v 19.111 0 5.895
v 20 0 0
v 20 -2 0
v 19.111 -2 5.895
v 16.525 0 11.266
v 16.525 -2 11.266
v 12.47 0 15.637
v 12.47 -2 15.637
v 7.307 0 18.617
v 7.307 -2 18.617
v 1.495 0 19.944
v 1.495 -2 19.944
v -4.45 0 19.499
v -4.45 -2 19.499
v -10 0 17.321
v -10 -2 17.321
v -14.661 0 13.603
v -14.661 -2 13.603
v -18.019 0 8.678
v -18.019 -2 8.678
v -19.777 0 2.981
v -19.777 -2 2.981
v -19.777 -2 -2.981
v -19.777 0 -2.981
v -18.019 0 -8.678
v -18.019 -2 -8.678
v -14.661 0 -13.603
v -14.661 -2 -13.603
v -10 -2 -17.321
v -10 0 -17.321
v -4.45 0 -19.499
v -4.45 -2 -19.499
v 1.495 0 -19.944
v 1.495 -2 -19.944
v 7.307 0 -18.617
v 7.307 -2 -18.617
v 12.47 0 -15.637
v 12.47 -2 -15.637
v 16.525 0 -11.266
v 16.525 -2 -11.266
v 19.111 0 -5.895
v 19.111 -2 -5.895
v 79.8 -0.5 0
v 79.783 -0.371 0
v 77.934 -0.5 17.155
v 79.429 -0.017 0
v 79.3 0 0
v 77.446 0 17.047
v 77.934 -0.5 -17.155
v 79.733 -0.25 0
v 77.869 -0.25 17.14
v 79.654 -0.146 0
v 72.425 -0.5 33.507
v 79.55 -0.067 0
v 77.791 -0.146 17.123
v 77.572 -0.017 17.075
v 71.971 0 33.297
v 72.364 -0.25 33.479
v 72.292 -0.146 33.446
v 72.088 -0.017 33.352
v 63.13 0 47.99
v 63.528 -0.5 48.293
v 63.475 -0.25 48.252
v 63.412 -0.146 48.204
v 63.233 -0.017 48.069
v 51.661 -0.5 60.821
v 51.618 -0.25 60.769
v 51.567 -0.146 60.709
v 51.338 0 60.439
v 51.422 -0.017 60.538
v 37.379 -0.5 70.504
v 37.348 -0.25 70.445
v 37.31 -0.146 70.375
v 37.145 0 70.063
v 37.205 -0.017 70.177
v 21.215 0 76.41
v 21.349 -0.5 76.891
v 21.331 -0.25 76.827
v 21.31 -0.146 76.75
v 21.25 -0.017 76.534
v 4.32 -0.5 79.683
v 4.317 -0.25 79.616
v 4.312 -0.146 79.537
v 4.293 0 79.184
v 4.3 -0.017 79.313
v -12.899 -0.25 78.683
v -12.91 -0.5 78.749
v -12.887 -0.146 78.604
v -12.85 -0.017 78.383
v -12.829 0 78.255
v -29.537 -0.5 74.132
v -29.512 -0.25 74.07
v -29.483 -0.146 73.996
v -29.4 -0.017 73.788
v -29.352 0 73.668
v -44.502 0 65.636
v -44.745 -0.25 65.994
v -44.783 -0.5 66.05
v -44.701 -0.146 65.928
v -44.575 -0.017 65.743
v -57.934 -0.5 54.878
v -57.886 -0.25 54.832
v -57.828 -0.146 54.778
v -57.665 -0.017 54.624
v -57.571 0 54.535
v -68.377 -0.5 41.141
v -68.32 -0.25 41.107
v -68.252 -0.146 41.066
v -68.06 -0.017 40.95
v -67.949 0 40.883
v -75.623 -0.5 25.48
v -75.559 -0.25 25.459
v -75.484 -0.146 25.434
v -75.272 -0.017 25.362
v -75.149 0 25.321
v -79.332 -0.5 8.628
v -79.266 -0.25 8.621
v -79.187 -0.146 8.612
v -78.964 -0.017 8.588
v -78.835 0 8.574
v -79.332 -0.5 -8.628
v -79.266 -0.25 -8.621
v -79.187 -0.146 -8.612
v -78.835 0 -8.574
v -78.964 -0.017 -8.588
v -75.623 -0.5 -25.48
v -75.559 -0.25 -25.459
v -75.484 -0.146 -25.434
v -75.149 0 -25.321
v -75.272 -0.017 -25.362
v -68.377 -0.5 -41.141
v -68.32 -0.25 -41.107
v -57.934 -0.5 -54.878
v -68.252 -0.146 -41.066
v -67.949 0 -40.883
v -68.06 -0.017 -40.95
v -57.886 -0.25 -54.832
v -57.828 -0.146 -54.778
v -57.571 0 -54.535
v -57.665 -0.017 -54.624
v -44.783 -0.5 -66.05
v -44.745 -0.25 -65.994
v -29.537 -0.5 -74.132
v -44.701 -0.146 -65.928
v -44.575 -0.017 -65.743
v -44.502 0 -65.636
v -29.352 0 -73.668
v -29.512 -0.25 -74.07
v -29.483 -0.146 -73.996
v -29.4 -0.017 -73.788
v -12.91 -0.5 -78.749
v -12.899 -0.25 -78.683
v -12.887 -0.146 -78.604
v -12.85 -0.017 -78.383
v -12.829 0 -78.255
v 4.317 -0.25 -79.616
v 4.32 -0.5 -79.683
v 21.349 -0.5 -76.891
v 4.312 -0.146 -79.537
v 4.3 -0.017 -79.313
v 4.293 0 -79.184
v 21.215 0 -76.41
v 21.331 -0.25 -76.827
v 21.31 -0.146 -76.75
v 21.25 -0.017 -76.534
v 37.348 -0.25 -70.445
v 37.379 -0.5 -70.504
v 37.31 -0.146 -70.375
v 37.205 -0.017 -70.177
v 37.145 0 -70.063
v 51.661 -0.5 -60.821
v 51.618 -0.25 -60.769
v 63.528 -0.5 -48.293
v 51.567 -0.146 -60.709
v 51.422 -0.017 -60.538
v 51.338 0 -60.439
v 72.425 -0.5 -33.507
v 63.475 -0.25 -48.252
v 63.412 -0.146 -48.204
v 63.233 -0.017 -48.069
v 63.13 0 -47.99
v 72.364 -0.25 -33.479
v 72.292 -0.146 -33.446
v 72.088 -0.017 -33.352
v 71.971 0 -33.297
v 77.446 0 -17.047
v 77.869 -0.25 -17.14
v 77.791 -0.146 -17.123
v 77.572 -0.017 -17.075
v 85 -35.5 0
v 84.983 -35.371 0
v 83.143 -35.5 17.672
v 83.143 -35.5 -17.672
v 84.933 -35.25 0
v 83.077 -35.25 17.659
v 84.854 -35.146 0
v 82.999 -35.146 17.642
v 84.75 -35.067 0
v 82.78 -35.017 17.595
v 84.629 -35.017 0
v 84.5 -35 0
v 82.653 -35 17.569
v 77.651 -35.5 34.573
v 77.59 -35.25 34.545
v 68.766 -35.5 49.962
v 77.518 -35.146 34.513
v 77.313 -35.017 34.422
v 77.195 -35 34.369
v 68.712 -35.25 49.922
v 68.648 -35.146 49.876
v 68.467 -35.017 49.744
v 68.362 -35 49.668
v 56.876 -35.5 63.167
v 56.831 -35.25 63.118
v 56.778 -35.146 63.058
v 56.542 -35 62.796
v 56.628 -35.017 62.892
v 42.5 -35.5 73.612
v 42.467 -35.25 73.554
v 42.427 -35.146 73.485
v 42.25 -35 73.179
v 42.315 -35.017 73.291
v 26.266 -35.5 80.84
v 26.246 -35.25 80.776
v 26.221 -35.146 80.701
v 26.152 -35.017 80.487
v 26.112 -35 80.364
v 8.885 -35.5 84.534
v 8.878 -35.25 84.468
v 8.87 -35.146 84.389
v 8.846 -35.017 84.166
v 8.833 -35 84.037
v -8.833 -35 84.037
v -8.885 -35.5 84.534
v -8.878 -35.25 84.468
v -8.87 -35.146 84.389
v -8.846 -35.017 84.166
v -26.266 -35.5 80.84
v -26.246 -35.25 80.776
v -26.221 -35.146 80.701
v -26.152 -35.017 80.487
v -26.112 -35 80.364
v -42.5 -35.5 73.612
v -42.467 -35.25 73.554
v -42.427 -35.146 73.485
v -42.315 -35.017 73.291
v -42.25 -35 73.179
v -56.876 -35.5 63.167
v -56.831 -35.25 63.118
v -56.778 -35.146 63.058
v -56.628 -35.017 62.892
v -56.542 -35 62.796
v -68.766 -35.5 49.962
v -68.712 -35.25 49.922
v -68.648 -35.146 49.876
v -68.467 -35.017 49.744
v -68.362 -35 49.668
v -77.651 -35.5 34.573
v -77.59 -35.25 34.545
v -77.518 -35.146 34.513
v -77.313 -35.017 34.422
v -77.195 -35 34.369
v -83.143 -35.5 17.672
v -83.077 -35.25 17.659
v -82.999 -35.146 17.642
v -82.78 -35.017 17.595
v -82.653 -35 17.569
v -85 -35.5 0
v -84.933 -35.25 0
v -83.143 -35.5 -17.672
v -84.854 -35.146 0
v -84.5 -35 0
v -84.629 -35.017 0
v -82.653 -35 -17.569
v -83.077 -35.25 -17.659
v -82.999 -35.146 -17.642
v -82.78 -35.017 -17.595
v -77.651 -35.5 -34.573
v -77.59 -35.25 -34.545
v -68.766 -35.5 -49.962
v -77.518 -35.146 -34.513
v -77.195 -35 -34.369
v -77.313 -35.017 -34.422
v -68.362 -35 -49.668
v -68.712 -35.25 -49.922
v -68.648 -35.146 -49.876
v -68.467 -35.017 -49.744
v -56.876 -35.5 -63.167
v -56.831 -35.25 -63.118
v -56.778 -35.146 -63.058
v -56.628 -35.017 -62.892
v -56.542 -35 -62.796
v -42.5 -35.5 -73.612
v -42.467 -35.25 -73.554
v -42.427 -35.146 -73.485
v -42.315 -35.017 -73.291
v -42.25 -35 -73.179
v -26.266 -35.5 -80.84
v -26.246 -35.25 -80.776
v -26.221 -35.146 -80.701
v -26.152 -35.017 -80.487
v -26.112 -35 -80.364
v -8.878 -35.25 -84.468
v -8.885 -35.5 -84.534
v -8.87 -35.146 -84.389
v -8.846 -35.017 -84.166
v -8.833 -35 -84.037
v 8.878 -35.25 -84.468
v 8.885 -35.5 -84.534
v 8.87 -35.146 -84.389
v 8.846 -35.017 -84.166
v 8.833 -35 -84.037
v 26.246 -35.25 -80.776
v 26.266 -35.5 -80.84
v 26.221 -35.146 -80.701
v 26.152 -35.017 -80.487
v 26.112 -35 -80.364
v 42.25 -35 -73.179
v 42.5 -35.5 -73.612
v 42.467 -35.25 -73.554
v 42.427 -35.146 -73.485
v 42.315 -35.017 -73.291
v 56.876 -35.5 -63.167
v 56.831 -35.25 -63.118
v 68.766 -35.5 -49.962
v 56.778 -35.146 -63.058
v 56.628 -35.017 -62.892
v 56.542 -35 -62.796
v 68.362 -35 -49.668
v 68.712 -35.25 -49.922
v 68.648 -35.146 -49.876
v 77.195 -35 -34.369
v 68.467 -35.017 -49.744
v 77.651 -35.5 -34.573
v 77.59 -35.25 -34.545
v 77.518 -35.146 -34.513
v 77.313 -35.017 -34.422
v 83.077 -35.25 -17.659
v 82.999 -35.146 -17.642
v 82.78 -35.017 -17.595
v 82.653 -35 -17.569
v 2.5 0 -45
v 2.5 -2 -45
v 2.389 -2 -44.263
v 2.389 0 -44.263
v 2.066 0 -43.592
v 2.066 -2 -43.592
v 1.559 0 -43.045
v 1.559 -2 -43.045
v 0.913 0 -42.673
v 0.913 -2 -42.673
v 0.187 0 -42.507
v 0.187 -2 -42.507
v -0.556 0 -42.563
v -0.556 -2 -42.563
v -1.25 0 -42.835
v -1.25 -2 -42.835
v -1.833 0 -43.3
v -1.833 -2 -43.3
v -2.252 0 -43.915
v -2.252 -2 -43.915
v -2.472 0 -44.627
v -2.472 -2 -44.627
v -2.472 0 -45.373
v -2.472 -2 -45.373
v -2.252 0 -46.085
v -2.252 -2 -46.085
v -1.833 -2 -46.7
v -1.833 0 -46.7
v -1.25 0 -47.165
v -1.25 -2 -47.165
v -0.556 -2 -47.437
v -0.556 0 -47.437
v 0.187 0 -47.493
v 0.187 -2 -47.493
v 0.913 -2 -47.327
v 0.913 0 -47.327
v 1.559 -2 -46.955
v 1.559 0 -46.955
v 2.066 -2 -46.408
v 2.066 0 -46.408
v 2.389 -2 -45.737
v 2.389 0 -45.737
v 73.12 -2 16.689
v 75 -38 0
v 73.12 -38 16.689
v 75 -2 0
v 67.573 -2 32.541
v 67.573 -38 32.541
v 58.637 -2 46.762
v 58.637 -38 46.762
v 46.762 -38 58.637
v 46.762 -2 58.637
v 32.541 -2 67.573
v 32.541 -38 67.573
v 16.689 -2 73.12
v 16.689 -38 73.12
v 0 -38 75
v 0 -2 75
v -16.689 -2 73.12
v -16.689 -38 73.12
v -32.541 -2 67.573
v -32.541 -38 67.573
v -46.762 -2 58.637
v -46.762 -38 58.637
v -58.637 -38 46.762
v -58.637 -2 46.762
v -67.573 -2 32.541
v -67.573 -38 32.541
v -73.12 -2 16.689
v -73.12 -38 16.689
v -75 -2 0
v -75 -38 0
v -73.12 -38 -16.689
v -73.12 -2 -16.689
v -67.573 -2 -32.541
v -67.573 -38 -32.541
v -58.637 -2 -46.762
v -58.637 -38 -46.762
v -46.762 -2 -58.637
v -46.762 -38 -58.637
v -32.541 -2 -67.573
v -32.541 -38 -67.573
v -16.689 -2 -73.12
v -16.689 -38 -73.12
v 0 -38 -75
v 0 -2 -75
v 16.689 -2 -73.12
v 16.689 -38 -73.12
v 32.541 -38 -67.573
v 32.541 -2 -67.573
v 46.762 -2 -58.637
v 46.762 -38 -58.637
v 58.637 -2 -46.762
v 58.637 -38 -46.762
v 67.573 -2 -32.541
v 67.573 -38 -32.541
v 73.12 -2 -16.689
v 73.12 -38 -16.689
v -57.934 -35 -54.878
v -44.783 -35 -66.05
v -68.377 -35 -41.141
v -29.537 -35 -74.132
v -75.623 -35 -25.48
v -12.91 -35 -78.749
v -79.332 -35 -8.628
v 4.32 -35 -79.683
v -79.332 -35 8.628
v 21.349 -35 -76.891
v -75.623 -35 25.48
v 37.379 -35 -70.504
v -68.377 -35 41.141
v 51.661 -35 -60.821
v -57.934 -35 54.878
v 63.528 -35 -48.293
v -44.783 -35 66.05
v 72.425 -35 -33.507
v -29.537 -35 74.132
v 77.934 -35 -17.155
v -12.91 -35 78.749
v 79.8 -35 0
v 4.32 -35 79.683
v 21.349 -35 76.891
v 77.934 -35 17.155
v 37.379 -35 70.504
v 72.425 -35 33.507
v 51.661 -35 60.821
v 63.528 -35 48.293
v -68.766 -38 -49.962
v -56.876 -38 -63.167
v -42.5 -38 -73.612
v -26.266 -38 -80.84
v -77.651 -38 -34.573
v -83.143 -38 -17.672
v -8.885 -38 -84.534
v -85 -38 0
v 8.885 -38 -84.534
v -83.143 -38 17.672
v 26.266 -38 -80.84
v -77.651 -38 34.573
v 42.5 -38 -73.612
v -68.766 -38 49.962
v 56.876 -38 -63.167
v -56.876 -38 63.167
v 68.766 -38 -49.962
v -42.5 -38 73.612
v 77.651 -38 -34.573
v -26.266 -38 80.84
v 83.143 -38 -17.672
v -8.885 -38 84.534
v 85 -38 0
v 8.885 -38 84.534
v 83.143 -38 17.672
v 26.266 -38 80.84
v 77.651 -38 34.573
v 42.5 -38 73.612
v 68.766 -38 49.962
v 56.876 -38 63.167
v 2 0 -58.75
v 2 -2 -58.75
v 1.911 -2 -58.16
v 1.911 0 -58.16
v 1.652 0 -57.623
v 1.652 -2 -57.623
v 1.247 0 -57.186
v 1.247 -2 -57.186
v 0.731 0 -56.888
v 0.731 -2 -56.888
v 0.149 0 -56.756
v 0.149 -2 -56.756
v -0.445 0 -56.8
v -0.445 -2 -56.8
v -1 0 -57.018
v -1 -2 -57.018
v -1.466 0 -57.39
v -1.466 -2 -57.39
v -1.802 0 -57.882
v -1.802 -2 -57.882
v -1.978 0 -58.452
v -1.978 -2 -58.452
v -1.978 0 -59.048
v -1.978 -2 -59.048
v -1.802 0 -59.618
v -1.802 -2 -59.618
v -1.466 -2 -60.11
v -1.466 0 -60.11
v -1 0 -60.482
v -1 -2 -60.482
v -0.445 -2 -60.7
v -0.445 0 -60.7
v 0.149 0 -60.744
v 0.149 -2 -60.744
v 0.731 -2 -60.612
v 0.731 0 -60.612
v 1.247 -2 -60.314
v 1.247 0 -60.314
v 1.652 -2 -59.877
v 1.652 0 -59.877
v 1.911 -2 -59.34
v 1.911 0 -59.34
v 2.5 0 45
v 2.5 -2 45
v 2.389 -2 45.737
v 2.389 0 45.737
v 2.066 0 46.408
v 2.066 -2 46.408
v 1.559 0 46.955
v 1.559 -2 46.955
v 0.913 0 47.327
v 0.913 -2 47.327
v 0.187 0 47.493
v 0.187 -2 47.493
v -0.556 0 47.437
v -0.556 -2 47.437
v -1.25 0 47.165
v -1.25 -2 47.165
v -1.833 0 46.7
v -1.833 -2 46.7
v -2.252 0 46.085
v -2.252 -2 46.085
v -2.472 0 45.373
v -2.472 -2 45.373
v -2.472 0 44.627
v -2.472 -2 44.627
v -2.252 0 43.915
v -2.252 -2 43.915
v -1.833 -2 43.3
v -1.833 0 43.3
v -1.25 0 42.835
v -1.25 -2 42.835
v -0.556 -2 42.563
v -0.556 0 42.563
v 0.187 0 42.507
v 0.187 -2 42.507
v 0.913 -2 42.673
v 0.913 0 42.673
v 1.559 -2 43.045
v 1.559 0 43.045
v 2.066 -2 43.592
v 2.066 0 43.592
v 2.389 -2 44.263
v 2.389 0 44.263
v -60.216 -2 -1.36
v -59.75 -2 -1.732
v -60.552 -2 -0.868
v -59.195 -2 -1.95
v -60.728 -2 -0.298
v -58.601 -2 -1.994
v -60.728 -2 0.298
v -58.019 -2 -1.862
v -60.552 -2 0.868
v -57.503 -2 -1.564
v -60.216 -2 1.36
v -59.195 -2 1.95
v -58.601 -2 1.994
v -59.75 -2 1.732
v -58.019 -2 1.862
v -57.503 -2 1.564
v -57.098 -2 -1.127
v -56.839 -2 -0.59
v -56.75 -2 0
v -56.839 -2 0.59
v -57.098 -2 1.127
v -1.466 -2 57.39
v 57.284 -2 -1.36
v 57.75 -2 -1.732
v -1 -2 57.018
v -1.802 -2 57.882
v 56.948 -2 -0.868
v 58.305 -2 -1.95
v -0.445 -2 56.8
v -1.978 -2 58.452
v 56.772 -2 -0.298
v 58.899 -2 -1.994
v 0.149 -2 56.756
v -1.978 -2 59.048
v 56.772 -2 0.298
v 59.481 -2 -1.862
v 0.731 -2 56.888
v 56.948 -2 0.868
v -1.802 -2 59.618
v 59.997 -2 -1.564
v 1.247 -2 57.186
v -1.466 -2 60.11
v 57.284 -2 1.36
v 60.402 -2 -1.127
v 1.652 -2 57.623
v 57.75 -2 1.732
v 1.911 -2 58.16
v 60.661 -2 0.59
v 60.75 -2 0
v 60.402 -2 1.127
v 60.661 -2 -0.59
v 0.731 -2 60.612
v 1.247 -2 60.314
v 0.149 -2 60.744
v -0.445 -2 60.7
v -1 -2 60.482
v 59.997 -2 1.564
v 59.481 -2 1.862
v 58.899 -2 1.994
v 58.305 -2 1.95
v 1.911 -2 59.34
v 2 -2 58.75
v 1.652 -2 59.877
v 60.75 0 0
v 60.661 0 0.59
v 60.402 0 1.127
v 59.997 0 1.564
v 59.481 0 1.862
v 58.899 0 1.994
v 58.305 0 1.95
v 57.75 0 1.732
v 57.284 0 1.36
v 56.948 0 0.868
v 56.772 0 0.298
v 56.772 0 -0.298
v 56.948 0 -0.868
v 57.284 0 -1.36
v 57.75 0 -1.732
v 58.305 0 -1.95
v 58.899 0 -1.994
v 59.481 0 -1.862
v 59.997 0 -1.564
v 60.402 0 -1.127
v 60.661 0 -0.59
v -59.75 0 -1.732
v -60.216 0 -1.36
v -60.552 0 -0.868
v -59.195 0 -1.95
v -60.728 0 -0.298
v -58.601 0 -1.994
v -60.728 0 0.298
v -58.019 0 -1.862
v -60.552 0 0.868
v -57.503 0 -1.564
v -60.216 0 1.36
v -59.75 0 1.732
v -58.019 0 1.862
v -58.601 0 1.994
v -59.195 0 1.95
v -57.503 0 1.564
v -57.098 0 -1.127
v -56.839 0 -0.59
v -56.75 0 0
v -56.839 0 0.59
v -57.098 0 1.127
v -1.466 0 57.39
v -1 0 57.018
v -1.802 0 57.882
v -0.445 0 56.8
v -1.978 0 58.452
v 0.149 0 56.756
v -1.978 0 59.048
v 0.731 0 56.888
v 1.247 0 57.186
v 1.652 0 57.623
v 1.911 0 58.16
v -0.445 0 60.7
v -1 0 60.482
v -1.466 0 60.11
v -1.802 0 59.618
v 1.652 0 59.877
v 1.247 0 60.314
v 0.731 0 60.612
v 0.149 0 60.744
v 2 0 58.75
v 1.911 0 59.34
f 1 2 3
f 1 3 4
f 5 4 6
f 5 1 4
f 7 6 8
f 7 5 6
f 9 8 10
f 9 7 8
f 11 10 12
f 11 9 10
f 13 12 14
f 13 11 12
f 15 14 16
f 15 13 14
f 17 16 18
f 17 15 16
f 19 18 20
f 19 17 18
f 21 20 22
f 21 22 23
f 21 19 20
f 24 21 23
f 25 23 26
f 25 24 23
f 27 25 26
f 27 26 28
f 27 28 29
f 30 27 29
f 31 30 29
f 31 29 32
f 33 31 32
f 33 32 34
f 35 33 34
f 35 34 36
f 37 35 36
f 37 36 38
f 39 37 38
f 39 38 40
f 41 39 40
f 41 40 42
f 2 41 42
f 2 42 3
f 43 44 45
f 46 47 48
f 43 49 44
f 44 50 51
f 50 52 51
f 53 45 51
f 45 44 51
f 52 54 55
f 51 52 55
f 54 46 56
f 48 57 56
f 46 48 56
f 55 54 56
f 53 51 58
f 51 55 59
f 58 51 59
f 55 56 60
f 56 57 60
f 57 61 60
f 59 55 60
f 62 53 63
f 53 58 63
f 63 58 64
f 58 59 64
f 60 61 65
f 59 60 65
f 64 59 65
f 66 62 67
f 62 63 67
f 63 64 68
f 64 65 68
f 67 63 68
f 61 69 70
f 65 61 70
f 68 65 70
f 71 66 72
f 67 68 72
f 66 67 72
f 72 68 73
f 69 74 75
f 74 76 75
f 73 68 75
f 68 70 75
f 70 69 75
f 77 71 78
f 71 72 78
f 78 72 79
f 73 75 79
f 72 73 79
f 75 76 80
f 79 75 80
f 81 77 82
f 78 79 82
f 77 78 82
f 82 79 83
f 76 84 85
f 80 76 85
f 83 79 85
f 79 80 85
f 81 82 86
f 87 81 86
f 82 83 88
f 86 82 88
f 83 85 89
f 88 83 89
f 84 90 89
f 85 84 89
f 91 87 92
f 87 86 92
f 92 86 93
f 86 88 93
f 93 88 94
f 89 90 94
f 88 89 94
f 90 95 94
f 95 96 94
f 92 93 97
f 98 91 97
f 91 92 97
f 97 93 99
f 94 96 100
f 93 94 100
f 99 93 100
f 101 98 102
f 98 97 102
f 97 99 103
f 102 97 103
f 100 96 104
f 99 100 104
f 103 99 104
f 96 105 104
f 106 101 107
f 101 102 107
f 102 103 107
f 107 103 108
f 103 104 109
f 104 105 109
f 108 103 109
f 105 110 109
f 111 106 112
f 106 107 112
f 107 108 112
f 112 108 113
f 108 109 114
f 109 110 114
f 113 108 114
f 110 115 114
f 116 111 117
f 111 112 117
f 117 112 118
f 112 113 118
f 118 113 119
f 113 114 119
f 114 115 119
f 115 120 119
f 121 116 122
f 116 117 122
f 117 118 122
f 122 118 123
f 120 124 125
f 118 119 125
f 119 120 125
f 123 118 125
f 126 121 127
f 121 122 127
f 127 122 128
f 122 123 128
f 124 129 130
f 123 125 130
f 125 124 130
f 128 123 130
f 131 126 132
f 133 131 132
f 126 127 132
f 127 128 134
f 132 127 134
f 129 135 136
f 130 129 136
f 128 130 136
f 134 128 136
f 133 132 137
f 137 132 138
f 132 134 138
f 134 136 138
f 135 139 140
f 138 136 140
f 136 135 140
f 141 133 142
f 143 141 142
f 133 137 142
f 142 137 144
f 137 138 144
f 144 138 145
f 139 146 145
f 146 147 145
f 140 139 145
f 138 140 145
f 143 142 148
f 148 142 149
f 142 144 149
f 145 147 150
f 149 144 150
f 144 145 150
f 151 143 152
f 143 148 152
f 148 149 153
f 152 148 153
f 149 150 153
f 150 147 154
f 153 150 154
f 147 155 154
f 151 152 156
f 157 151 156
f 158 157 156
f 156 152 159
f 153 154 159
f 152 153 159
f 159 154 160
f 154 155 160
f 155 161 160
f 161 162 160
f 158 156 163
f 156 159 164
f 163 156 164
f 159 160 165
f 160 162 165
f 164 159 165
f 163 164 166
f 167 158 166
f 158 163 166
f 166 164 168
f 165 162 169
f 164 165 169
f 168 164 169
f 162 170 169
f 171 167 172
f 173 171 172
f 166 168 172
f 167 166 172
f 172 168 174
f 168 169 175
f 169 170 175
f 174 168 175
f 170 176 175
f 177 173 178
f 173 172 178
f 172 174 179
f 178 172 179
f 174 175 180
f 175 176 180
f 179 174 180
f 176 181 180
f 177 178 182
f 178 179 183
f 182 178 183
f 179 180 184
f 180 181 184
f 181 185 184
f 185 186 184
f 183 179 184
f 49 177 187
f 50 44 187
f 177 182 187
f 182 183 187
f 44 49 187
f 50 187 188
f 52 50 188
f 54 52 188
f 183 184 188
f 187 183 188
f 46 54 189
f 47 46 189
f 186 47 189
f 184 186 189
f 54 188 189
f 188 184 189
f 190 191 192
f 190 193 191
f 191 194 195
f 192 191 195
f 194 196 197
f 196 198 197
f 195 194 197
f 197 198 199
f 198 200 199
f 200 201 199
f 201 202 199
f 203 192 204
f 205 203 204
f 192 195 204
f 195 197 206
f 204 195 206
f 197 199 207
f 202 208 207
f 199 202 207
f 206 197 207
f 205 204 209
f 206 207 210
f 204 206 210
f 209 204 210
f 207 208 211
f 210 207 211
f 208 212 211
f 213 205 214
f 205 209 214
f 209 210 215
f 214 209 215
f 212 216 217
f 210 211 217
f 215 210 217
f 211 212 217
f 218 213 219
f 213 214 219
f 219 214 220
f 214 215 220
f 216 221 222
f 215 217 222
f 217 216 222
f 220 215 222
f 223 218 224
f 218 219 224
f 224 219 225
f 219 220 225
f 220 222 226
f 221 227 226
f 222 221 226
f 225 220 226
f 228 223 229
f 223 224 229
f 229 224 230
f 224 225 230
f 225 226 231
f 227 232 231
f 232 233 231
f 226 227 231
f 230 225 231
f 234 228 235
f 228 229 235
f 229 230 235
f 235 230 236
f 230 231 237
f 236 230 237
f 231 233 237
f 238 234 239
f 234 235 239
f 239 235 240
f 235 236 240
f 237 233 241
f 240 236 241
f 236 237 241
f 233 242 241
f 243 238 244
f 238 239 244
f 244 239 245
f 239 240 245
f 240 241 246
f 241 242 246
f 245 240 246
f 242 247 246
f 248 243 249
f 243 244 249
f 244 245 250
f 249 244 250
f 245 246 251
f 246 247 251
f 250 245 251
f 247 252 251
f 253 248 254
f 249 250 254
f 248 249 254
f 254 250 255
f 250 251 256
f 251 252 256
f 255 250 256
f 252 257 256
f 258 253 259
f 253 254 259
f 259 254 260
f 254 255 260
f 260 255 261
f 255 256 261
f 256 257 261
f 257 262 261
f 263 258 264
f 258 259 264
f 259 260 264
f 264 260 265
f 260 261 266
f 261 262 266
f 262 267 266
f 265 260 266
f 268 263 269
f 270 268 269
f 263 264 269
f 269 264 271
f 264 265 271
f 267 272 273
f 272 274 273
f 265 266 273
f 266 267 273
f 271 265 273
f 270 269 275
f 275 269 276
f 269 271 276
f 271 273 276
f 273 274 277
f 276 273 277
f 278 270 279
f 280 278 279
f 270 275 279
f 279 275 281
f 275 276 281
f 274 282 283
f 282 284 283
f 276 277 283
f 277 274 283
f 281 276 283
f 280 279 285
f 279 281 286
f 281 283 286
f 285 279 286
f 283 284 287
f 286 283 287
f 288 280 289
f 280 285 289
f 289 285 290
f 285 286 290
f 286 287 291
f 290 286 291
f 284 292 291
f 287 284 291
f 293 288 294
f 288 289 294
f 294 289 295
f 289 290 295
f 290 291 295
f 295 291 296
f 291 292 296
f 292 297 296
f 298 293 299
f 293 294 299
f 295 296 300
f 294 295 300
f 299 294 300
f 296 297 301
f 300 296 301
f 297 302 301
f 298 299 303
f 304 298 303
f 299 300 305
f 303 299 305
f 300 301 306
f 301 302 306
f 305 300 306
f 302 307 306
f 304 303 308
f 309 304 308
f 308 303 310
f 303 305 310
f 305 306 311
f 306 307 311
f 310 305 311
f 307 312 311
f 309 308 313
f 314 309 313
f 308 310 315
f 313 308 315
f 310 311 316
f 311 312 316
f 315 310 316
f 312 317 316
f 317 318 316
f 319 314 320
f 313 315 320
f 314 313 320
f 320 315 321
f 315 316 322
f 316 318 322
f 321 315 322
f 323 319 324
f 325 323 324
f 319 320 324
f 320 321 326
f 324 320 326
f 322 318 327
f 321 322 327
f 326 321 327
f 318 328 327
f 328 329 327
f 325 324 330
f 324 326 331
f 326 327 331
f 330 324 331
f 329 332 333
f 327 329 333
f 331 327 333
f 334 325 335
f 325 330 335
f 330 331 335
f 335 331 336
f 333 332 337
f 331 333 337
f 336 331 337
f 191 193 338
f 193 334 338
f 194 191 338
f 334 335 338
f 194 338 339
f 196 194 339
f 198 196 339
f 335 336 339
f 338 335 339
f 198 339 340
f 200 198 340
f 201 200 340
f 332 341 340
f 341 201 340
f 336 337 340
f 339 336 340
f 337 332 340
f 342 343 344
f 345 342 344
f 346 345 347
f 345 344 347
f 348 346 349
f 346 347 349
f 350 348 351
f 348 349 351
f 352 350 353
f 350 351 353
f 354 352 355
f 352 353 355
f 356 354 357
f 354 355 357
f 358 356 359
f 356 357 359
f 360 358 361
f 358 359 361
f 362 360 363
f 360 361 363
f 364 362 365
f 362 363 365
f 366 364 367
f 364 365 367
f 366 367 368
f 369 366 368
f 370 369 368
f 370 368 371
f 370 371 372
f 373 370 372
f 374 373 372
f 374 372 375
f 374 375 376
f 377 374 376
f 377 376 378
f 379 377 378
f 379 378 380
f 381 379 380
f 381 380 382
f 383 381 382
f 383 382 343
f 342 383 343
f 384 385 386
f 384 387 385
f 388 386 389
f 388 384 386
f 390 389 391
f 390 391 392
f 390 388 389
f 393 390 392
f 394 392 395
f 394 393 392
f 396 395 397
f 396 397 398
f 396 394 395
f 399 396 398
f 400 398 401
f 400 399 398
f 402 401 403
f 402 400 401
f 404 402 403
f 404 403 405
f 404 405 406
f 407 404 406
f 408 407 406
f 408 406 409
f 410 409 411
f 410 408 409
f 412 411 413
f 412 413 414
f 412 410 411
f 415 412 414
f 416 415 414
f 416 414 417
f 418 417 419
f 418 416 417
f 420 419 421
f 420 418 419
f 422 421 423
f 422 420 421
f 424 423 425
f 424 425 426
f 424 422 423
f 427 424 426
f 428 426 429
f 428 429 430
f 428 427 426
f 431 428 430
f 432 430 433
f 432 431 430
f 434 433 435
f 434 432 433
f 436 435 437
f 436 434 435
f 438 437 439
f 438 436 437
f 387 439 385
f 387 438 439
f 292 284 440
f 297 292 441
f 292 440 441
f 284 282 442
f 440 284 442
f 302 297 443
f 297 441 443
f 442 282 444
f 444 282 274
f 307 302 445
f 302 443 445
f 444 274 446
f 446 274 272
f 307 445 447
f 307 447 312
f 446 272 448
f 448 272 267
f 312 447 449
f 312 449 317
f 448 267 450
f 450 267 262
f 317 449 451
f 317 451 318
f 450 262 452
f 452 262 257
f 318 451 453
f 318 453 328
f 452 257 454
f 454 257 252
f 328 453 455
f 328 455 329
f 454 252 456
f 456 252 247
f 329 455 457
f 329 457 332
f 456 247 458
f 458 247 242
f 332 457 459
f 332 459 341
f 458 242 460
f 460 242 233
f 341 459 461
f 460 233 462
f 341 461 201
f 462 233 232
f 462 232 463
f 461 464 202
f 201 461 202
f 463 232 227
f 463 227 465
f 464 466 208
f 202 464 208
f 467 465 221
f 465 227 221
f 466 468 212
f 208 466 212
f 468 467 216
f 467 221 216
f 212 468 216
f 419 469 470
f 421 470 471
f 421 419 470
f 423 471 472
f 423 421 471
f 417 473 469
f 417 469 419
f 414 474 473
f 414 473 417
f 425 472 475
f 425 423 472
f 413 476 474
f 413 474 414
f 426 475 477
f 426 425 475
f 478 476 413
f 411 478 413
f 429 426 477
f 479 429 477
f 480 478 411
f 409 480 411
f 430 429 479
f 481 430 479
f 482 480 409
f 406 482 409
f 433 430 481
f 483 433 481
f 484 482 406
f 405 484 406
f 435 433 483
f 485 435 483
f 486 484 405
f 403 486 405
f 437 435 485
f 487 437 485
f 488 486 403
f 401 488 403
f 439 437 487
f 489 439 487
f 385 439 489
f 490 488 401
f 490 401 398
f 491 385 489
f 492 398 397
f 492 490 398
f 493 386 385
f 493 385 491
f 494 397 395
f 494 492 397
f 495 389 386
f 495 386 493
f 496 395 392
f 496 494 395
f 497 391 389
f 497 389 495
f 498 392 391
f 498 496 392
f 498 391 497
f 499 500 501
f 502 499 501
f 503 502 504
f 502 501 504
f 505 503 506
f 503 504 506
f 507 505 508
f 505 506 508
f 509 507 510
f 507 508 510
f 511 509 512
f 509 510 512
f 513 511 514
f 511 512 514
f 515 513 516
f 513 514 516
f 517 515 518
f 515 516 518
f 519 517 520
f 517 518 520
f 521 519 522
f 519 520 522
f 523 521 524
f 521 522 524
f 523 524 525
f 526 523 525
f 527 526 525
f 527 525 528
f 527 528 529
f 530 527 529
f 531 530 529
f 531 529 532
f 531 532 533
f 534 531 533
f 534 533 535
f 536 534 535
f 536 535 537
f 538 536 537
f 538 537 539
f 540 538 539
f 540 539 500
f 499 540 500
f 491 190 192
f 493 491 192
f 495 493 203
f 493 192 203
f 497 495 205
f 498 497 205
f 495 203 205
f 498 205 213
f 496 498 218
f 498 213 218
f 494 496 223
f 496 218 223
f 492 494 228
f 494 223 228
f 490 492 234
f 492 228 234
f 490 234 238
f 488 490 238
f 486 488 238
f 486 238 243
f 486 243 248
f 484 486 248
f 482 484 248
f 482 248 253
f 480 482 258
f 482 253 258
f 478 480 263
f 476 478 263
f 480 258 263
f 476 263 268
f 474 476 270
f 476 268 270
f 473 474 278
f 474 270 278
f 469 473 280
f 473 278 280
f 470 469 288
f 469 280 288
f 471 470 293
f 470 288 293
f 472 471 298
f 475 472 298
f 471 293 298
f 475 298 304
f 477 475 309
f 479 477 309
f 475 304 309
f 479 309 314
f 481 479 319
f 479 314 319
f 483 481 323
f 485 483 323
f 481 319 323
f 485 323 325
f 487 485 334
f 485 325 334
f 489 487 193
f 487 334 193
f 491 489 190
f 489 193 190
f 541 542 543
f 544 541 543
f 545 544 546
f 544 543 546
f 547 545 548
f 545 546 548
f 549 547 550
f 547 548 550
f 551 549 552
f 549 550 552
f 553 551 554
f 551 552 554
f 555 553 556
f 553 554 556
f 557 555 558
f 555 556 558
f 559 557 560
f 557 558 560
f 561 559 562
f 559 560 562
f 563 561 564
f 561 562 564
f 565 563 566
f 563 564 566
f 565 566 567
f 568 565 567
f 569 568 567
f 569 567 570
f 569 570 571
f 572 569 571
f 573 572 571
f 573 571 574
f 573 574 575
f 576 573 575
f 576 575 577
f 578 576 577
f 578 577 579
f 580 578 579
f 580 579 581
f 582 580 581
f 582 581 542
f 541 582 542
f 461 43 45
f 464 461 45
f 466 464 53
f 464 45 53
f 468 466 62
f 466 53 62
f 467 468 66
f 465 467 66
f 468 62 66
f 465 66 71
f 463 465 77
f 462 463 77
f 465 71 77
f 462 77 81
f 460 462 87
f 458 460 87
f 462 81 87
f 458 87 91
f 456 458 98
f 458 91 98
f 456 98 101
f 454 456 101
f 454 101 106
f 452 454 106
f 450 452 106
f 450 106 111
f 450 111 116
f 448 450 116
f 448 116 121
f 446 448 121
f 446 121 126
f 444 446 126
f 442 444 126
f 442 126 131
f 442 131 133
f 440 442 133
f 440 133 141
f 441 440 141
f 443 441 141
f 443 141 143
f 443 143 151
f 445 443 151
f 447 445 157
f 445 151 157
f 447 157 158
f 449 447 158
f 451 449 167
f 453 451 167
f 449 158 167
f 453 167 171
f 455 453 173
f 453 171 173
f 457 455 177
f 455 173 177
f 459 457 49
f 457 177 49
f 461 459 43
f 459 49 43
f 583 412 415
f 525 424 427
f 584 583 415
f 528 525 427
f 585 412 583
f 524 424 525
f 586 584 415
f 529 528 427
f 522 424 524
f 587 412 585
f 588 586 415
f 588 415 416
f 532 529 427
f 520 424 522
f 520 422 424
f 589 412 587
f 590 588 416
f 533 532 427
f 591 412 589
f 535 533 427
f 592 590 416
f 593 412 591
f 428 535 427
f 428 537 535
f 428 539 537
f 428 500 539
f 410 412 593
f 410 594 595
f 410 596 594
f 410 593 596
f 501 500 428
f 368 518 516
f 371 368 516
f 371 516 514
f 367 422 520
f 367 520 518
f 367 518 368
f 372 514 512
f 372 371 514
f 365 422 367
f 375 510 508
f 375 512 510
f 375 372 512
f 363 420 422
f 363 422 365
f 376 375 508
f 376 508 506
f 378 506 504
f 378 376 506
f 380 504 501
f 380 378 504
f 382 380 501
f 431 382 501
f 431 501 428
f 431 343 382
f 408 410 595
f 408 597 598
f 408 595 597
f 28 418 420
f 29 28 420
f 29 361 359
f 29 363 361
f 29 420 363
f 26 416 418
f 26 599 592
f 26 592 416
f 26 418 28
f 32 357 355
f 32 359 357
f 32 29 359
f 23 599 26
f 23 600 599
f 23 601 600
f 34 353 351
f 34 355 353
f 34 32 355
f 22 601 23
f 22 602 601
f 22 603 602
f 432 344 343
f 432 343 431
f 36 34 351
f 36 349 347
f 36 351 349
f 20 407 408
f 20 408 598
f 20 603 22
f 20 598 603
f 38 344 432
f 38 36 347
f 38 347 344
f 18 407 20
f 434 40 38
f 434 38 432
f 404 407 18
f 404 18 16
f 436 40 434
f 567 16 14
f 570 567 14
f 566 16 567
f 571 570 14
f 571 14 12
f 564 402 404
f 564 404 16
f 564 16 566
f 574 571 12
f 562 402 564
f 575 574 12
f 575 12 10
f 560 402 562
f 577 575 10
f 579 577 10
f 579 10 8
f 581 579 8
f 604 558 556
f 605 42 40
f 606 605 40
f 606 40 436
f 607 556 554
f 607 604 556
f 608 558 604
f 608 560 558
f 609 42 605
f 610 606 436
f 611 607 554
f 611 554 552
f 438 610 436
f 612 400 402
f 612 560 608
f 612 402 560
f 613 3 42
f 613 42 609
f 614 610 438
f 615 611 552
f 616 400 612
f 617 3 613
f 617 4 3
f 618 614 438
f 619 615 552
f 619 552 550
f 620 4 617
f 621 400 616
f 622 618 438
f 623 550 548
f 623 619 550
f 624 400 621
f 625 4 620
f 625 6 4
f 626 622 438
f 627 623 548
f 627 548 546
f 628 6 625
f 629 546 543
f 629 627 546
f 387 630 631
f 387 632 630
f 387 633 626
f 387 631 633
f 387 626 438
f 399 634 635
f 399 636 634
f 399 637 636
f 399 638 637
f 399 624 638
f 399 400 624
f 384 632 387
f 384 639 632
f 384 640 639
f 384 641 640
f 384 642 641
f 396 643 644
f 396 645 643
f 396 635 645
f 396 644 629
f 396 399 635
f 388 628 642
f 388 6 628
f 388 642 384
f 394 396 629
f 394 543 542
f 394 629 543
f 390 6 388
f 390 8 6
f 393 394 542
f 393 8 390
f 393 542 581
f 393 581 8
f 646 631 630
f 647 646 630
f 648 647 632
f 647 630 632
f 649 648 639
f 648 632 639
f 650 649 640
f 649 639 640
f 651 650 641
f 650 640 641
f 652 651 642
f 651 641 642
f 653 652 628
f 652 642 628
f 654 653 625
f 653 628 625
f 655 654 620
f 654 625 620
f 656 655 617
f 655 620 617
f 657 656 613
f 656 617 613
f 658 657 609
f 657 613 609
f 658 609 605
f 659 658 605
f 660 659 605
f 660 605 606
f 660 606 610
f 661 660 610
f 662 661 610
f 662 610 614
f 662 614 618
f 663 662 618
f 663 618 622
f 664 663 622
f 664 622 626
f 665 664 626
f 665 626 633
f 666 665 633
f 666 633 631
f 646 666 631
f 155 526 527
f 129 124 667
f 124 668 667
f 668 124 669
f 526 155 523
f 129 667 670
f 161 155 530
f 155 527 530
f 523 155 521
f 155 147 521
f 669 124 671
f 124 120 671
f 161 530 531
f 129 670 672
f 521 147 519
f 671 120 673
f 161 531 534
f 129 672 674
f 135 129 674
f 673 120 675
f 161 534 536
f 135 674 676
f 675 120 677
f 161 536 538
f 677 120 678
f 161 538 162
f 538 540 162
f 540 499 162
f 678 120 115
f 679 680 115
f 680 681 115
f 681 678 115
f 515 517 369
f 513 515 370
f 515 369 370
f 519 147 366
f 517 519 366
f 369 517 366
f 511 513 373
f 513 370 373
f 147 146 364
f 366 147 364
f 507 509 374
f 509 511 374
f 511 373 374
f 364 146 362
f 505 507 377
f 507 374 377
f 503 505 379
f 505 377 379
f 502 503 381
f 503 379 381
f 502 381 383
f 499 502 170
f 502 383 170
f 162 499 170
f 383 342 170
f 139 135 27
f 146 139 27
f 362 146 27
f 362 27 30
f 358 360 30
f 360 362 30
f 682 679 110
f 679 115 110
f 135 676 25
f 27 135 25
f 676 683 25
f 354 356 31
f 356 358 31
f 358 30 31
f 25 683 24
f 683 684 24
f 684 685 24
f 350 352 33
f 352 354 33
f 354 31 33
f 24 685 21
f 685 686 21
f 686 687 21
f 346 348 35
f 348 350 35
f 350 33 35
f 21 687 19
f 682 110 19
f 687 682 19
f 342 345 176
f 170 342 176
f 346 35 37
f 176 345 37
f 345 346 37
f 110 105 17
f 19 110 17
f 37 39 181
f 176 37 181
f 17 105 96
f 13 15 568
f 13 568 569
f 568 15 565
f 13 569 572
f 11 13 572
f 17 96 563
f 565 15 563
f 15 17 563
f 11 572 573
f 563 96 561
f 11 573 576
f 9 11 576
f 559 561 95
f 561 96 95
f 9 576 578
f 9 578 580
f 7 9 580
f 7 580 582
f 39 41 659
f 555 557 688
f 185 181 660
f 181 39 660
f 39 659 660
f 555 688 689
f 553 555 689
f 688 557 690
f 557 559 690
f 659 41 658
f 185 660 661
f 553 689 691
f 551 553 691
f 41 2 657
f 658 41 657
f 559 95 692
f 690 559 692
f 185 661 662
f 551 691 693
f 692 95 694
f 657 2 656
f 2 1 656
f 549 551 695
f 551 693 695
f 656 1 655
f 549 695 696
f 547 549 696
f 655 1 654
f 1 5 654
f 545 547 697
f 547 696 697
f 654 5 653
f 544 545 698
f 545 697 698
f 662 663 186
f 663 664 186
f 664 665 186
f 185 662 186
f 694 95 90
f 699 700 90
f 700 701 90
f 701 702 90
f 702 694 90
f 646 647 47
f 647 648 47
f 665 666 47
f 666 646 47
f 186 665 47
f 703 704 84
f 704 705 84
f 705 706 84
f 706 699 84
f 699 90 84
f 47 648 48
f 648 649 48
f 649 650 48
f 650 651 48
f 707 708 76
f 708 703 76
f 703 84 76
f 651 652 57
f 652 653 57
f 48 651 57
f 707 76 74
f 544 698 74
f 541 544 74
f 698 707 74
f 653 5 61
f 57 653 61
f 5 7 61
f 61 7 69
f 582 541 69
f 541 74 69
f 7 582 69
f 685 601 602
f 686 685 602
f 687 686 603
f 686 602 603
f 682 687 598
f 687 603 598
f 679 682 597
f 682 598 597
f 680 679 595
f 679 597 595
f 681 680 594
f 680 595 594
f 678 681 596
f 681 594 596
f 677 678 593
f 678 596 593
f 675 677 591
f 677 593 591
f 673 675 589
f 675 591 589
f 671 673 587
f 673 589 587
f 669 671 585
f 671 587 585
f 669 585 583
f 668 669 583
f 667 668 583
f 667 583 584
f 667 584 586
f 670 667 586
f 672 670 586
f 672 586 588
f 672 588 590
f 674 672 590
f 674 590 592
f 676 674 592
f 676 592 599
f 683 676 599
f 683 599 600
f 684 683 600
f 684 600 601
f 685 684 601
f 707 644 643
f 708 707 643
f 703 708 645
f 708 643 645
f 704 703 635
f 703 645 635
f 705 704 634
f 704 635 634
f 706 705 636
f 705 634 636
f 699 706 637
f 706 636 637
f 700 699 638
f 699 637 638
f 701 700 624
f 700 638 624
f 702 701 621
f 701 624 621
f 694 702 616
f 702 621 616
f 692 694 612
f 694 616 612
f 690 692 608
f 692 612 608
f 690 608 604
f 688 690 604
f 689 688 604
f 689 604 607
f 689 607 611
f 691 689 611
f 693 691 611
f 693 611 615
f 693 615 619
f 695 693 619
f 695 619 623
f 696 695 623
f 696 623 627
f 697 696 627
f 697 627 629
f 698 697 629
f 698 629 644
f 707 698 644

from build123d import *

# Parameters (mm, degrees)
F0_R      = 79.8
F0_R_2    = 20
F1_DEPTH  = 5
F2_R      = 79.8
F2_R_2    = 75
F3_DEPTH  = 30
F4_R      = 85
F4_R_2    = 75
F5_DEPTH  = 3
F7_D      = 5
F7_DEPTH  = 25
F7_TIP    = 1.5021515476
F8_R      = 0.5
F9_DEPTH  = 3
F11_D     = 4
F11_DEPTH = 25
F11_TIP   = 1.2017212381


with BuildPart() as f1:
    # F0 (on Front) → F1 (new body)
    with BuildSketch(Plane.XZ):
        Circle(F0_R)
        Circle(F0_R_2, mode=Mode.SUBTRACT)
    extrude(amount=F1_DEPTH)

    # F2 (on face) → F3 (join)
    with BuildSketch(Plane.XZ.offset(5)):
        Circle(F2_R)
        Circle(F2_R_2, mode=Mode.SUBTRACT)
    extrude(amount=F3_DEPTH)

    # F4 (on face) → F5 (join)
    with BuildSketch(Plane.XZ.offset(35)):
        Circle(F4_R)
        Circle(F4_R_2, mode=Mode.SUBTRACT)
    extrude(amount=F5_DEPTH)

    # F7
    with Locations(Plane(origin=(0, 0, 0), x_dir=(-1, 0, 0), z_dir=(0, 1, 0))):
        with Locations((0, 45), (0, -45)):
            Hole(F7_D / 2, depth=F7_DEPTH)
            with Locations((0, 0, -(F7_DEPTH + F7_TIP / 2))):  # 118° drill point
                Cone(0, F7_D / 2, F7_TIP, mode=Mode.SUBTRACT)

    # F8
    f8_edges = [f1.edges().sort_by_distance(p)[0] for p in [
        (-79.8, 0, 0),
        (-85, -35, 0),
    ]]
    fillet(f8_edges, radius=F8_R)

    # F9 (cut): a face of the model
    f9_faces = [f1.faces().sort_by_distance(p)[0] for p in [
        (-72.8786796564, -5, 0),
    ]]
    extrude(f9_faces, amount=-F9_DEPTH, mode=Mode.SUBTRACT)

    # F11
    with Locations(Plane(origin=(0, 0, 0), x_dir=(-1, 0, 0), z_dir=(0, 1, 0))):
        with Locations((-58.75, 0), (0, 58.75), (58.75, 0), (0, -58.75)):
            Hole(F11_D / 2, depth=F11_DEPTH)
            with Locations((0, 0, -(F11_DEPTH + F11_TIP / 2))):  # 118° drill point
                Cone(0, F11_D / 2, F11_TIP, mode=Mode.SUBTRACT)


solid = f1.part
